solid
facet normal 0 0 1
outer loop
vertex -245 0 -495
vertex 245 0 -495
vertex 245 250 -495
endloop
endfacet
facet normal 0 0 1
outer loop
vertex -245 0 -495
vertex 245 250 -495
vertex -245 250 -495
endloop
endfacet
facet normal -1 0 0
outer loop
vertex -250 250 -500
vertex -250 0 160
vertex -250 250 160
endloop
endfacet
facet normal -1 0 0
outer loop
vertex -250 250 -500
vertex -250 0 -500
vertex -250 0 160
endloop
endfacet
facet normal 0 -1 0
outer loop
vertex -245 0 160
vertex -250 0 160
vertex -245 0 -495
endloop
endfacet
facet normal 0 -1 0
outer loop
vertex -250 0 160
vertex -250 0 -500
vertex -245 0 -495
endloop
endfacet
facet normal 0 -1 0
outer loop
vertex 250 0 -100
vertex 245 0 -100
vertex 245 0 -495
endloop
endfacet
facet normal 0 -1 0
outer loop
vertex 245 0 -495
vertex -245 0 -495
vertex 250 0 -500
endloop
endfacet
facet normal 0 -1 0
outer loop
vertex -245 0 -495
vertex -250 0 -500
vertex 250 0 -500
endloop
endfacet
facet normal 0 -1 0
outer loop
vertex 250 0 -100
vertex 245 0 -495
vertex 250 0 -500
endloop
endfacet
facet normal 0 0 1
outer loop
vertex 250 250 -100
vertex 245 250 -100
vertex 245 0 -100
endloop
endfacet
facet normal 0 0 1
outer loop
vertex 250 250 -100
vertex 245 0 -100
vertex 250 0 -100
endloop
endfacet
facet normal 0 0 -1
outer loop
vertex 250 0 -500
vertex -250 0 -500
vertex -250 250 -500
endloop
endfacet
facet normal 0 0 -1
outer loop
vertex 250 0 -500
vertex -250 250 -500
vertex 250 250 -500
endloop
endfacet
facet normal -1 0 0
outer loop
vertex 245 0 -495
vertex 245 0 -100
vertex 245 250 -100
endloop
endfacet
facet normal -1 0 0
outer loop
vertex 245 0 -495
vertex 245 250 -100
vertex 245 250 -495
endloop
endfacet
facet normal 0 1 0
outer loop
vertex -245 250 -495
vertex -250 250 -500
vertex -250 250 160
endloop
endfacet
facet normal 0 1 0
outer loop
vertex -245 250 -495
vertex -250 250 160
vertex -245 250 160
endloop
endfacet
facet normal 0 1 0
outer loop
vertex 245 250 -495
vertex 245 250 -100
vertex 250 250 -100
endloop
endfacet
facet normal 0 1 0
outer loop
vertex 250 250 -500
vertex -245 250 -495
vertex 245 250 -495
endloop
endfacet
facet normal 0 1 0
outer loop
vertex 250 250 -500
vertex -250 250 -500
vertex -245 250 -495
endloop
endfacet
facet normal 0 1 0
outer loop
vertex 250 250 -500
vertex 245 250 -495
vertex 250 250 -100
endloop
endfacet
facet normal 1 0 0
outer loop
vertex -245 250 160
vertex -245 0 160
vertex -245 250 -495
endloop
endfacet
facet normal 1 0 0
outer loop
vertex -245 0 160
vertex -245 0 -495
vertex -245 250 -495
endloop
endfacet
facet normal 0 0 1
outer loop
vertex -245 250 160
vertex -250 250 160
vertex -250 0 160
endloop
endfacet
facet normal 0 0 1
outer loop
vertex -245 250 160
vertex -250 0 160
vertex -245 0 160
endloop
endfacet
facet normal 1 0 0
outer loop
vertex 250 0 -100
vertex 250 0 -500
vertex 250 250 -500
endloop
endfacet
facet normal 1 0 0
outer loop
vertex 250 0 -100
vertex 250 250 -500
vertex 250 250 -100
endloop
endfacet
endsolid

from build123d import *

# Parameters (mm, degrees)
BOSS_EXTRUDE1_DEPTH = 250
SKETCH3_W           = 5
SKETCH3_H           = 100
CUT_EXTRUDE1_DEPTH  = 250
SKETCH4_W           = 5
SKETCH4_H           = 250
BOSS_EXTRUDE2_DEPTH = 160


with BuildPart() as part:
    # Sketch1 → Boss-Extrude1 (new body)
    with BuildSketch(Plane(origin=(0, 0, 0), x_dir=(1, 0, 0), z_dir=(0, 1, 0))):
        Polygon((-250, 0), (-250, 500), (250, 500), (250, 0), (245, 0), (245, 495), (-245, 495), (-245, 0), align=None)
    extrude(amount=BOSS_EXTRUDE1_DEPTH)

    # Sketch3 → Cut-Extrude1 (cut)
    with BuildSketch(Plane(origin=(0, 250, 0), x_dir=(1, 0, 0), z_dir=(0, 1, 0))):
        with Locations((247.5, 50)):
            Rectangle(SKETCH3_W, SKETCH3_H)
    extrude(amount=-CUT_EXTRUDE1_DEPTH, mode=Mode.SUBTRACT)

    # Sketch4 → Boss-Extrude2 (add)
    with BuildSketch(Plane.XY):
        with Locations((-247.5, 125)):
            Rectangle(SKETCH4_W, SKETCH4_H)
    extrude(amount=BOSS_EXTRUDE2_DEPTH)


solid = part.part
